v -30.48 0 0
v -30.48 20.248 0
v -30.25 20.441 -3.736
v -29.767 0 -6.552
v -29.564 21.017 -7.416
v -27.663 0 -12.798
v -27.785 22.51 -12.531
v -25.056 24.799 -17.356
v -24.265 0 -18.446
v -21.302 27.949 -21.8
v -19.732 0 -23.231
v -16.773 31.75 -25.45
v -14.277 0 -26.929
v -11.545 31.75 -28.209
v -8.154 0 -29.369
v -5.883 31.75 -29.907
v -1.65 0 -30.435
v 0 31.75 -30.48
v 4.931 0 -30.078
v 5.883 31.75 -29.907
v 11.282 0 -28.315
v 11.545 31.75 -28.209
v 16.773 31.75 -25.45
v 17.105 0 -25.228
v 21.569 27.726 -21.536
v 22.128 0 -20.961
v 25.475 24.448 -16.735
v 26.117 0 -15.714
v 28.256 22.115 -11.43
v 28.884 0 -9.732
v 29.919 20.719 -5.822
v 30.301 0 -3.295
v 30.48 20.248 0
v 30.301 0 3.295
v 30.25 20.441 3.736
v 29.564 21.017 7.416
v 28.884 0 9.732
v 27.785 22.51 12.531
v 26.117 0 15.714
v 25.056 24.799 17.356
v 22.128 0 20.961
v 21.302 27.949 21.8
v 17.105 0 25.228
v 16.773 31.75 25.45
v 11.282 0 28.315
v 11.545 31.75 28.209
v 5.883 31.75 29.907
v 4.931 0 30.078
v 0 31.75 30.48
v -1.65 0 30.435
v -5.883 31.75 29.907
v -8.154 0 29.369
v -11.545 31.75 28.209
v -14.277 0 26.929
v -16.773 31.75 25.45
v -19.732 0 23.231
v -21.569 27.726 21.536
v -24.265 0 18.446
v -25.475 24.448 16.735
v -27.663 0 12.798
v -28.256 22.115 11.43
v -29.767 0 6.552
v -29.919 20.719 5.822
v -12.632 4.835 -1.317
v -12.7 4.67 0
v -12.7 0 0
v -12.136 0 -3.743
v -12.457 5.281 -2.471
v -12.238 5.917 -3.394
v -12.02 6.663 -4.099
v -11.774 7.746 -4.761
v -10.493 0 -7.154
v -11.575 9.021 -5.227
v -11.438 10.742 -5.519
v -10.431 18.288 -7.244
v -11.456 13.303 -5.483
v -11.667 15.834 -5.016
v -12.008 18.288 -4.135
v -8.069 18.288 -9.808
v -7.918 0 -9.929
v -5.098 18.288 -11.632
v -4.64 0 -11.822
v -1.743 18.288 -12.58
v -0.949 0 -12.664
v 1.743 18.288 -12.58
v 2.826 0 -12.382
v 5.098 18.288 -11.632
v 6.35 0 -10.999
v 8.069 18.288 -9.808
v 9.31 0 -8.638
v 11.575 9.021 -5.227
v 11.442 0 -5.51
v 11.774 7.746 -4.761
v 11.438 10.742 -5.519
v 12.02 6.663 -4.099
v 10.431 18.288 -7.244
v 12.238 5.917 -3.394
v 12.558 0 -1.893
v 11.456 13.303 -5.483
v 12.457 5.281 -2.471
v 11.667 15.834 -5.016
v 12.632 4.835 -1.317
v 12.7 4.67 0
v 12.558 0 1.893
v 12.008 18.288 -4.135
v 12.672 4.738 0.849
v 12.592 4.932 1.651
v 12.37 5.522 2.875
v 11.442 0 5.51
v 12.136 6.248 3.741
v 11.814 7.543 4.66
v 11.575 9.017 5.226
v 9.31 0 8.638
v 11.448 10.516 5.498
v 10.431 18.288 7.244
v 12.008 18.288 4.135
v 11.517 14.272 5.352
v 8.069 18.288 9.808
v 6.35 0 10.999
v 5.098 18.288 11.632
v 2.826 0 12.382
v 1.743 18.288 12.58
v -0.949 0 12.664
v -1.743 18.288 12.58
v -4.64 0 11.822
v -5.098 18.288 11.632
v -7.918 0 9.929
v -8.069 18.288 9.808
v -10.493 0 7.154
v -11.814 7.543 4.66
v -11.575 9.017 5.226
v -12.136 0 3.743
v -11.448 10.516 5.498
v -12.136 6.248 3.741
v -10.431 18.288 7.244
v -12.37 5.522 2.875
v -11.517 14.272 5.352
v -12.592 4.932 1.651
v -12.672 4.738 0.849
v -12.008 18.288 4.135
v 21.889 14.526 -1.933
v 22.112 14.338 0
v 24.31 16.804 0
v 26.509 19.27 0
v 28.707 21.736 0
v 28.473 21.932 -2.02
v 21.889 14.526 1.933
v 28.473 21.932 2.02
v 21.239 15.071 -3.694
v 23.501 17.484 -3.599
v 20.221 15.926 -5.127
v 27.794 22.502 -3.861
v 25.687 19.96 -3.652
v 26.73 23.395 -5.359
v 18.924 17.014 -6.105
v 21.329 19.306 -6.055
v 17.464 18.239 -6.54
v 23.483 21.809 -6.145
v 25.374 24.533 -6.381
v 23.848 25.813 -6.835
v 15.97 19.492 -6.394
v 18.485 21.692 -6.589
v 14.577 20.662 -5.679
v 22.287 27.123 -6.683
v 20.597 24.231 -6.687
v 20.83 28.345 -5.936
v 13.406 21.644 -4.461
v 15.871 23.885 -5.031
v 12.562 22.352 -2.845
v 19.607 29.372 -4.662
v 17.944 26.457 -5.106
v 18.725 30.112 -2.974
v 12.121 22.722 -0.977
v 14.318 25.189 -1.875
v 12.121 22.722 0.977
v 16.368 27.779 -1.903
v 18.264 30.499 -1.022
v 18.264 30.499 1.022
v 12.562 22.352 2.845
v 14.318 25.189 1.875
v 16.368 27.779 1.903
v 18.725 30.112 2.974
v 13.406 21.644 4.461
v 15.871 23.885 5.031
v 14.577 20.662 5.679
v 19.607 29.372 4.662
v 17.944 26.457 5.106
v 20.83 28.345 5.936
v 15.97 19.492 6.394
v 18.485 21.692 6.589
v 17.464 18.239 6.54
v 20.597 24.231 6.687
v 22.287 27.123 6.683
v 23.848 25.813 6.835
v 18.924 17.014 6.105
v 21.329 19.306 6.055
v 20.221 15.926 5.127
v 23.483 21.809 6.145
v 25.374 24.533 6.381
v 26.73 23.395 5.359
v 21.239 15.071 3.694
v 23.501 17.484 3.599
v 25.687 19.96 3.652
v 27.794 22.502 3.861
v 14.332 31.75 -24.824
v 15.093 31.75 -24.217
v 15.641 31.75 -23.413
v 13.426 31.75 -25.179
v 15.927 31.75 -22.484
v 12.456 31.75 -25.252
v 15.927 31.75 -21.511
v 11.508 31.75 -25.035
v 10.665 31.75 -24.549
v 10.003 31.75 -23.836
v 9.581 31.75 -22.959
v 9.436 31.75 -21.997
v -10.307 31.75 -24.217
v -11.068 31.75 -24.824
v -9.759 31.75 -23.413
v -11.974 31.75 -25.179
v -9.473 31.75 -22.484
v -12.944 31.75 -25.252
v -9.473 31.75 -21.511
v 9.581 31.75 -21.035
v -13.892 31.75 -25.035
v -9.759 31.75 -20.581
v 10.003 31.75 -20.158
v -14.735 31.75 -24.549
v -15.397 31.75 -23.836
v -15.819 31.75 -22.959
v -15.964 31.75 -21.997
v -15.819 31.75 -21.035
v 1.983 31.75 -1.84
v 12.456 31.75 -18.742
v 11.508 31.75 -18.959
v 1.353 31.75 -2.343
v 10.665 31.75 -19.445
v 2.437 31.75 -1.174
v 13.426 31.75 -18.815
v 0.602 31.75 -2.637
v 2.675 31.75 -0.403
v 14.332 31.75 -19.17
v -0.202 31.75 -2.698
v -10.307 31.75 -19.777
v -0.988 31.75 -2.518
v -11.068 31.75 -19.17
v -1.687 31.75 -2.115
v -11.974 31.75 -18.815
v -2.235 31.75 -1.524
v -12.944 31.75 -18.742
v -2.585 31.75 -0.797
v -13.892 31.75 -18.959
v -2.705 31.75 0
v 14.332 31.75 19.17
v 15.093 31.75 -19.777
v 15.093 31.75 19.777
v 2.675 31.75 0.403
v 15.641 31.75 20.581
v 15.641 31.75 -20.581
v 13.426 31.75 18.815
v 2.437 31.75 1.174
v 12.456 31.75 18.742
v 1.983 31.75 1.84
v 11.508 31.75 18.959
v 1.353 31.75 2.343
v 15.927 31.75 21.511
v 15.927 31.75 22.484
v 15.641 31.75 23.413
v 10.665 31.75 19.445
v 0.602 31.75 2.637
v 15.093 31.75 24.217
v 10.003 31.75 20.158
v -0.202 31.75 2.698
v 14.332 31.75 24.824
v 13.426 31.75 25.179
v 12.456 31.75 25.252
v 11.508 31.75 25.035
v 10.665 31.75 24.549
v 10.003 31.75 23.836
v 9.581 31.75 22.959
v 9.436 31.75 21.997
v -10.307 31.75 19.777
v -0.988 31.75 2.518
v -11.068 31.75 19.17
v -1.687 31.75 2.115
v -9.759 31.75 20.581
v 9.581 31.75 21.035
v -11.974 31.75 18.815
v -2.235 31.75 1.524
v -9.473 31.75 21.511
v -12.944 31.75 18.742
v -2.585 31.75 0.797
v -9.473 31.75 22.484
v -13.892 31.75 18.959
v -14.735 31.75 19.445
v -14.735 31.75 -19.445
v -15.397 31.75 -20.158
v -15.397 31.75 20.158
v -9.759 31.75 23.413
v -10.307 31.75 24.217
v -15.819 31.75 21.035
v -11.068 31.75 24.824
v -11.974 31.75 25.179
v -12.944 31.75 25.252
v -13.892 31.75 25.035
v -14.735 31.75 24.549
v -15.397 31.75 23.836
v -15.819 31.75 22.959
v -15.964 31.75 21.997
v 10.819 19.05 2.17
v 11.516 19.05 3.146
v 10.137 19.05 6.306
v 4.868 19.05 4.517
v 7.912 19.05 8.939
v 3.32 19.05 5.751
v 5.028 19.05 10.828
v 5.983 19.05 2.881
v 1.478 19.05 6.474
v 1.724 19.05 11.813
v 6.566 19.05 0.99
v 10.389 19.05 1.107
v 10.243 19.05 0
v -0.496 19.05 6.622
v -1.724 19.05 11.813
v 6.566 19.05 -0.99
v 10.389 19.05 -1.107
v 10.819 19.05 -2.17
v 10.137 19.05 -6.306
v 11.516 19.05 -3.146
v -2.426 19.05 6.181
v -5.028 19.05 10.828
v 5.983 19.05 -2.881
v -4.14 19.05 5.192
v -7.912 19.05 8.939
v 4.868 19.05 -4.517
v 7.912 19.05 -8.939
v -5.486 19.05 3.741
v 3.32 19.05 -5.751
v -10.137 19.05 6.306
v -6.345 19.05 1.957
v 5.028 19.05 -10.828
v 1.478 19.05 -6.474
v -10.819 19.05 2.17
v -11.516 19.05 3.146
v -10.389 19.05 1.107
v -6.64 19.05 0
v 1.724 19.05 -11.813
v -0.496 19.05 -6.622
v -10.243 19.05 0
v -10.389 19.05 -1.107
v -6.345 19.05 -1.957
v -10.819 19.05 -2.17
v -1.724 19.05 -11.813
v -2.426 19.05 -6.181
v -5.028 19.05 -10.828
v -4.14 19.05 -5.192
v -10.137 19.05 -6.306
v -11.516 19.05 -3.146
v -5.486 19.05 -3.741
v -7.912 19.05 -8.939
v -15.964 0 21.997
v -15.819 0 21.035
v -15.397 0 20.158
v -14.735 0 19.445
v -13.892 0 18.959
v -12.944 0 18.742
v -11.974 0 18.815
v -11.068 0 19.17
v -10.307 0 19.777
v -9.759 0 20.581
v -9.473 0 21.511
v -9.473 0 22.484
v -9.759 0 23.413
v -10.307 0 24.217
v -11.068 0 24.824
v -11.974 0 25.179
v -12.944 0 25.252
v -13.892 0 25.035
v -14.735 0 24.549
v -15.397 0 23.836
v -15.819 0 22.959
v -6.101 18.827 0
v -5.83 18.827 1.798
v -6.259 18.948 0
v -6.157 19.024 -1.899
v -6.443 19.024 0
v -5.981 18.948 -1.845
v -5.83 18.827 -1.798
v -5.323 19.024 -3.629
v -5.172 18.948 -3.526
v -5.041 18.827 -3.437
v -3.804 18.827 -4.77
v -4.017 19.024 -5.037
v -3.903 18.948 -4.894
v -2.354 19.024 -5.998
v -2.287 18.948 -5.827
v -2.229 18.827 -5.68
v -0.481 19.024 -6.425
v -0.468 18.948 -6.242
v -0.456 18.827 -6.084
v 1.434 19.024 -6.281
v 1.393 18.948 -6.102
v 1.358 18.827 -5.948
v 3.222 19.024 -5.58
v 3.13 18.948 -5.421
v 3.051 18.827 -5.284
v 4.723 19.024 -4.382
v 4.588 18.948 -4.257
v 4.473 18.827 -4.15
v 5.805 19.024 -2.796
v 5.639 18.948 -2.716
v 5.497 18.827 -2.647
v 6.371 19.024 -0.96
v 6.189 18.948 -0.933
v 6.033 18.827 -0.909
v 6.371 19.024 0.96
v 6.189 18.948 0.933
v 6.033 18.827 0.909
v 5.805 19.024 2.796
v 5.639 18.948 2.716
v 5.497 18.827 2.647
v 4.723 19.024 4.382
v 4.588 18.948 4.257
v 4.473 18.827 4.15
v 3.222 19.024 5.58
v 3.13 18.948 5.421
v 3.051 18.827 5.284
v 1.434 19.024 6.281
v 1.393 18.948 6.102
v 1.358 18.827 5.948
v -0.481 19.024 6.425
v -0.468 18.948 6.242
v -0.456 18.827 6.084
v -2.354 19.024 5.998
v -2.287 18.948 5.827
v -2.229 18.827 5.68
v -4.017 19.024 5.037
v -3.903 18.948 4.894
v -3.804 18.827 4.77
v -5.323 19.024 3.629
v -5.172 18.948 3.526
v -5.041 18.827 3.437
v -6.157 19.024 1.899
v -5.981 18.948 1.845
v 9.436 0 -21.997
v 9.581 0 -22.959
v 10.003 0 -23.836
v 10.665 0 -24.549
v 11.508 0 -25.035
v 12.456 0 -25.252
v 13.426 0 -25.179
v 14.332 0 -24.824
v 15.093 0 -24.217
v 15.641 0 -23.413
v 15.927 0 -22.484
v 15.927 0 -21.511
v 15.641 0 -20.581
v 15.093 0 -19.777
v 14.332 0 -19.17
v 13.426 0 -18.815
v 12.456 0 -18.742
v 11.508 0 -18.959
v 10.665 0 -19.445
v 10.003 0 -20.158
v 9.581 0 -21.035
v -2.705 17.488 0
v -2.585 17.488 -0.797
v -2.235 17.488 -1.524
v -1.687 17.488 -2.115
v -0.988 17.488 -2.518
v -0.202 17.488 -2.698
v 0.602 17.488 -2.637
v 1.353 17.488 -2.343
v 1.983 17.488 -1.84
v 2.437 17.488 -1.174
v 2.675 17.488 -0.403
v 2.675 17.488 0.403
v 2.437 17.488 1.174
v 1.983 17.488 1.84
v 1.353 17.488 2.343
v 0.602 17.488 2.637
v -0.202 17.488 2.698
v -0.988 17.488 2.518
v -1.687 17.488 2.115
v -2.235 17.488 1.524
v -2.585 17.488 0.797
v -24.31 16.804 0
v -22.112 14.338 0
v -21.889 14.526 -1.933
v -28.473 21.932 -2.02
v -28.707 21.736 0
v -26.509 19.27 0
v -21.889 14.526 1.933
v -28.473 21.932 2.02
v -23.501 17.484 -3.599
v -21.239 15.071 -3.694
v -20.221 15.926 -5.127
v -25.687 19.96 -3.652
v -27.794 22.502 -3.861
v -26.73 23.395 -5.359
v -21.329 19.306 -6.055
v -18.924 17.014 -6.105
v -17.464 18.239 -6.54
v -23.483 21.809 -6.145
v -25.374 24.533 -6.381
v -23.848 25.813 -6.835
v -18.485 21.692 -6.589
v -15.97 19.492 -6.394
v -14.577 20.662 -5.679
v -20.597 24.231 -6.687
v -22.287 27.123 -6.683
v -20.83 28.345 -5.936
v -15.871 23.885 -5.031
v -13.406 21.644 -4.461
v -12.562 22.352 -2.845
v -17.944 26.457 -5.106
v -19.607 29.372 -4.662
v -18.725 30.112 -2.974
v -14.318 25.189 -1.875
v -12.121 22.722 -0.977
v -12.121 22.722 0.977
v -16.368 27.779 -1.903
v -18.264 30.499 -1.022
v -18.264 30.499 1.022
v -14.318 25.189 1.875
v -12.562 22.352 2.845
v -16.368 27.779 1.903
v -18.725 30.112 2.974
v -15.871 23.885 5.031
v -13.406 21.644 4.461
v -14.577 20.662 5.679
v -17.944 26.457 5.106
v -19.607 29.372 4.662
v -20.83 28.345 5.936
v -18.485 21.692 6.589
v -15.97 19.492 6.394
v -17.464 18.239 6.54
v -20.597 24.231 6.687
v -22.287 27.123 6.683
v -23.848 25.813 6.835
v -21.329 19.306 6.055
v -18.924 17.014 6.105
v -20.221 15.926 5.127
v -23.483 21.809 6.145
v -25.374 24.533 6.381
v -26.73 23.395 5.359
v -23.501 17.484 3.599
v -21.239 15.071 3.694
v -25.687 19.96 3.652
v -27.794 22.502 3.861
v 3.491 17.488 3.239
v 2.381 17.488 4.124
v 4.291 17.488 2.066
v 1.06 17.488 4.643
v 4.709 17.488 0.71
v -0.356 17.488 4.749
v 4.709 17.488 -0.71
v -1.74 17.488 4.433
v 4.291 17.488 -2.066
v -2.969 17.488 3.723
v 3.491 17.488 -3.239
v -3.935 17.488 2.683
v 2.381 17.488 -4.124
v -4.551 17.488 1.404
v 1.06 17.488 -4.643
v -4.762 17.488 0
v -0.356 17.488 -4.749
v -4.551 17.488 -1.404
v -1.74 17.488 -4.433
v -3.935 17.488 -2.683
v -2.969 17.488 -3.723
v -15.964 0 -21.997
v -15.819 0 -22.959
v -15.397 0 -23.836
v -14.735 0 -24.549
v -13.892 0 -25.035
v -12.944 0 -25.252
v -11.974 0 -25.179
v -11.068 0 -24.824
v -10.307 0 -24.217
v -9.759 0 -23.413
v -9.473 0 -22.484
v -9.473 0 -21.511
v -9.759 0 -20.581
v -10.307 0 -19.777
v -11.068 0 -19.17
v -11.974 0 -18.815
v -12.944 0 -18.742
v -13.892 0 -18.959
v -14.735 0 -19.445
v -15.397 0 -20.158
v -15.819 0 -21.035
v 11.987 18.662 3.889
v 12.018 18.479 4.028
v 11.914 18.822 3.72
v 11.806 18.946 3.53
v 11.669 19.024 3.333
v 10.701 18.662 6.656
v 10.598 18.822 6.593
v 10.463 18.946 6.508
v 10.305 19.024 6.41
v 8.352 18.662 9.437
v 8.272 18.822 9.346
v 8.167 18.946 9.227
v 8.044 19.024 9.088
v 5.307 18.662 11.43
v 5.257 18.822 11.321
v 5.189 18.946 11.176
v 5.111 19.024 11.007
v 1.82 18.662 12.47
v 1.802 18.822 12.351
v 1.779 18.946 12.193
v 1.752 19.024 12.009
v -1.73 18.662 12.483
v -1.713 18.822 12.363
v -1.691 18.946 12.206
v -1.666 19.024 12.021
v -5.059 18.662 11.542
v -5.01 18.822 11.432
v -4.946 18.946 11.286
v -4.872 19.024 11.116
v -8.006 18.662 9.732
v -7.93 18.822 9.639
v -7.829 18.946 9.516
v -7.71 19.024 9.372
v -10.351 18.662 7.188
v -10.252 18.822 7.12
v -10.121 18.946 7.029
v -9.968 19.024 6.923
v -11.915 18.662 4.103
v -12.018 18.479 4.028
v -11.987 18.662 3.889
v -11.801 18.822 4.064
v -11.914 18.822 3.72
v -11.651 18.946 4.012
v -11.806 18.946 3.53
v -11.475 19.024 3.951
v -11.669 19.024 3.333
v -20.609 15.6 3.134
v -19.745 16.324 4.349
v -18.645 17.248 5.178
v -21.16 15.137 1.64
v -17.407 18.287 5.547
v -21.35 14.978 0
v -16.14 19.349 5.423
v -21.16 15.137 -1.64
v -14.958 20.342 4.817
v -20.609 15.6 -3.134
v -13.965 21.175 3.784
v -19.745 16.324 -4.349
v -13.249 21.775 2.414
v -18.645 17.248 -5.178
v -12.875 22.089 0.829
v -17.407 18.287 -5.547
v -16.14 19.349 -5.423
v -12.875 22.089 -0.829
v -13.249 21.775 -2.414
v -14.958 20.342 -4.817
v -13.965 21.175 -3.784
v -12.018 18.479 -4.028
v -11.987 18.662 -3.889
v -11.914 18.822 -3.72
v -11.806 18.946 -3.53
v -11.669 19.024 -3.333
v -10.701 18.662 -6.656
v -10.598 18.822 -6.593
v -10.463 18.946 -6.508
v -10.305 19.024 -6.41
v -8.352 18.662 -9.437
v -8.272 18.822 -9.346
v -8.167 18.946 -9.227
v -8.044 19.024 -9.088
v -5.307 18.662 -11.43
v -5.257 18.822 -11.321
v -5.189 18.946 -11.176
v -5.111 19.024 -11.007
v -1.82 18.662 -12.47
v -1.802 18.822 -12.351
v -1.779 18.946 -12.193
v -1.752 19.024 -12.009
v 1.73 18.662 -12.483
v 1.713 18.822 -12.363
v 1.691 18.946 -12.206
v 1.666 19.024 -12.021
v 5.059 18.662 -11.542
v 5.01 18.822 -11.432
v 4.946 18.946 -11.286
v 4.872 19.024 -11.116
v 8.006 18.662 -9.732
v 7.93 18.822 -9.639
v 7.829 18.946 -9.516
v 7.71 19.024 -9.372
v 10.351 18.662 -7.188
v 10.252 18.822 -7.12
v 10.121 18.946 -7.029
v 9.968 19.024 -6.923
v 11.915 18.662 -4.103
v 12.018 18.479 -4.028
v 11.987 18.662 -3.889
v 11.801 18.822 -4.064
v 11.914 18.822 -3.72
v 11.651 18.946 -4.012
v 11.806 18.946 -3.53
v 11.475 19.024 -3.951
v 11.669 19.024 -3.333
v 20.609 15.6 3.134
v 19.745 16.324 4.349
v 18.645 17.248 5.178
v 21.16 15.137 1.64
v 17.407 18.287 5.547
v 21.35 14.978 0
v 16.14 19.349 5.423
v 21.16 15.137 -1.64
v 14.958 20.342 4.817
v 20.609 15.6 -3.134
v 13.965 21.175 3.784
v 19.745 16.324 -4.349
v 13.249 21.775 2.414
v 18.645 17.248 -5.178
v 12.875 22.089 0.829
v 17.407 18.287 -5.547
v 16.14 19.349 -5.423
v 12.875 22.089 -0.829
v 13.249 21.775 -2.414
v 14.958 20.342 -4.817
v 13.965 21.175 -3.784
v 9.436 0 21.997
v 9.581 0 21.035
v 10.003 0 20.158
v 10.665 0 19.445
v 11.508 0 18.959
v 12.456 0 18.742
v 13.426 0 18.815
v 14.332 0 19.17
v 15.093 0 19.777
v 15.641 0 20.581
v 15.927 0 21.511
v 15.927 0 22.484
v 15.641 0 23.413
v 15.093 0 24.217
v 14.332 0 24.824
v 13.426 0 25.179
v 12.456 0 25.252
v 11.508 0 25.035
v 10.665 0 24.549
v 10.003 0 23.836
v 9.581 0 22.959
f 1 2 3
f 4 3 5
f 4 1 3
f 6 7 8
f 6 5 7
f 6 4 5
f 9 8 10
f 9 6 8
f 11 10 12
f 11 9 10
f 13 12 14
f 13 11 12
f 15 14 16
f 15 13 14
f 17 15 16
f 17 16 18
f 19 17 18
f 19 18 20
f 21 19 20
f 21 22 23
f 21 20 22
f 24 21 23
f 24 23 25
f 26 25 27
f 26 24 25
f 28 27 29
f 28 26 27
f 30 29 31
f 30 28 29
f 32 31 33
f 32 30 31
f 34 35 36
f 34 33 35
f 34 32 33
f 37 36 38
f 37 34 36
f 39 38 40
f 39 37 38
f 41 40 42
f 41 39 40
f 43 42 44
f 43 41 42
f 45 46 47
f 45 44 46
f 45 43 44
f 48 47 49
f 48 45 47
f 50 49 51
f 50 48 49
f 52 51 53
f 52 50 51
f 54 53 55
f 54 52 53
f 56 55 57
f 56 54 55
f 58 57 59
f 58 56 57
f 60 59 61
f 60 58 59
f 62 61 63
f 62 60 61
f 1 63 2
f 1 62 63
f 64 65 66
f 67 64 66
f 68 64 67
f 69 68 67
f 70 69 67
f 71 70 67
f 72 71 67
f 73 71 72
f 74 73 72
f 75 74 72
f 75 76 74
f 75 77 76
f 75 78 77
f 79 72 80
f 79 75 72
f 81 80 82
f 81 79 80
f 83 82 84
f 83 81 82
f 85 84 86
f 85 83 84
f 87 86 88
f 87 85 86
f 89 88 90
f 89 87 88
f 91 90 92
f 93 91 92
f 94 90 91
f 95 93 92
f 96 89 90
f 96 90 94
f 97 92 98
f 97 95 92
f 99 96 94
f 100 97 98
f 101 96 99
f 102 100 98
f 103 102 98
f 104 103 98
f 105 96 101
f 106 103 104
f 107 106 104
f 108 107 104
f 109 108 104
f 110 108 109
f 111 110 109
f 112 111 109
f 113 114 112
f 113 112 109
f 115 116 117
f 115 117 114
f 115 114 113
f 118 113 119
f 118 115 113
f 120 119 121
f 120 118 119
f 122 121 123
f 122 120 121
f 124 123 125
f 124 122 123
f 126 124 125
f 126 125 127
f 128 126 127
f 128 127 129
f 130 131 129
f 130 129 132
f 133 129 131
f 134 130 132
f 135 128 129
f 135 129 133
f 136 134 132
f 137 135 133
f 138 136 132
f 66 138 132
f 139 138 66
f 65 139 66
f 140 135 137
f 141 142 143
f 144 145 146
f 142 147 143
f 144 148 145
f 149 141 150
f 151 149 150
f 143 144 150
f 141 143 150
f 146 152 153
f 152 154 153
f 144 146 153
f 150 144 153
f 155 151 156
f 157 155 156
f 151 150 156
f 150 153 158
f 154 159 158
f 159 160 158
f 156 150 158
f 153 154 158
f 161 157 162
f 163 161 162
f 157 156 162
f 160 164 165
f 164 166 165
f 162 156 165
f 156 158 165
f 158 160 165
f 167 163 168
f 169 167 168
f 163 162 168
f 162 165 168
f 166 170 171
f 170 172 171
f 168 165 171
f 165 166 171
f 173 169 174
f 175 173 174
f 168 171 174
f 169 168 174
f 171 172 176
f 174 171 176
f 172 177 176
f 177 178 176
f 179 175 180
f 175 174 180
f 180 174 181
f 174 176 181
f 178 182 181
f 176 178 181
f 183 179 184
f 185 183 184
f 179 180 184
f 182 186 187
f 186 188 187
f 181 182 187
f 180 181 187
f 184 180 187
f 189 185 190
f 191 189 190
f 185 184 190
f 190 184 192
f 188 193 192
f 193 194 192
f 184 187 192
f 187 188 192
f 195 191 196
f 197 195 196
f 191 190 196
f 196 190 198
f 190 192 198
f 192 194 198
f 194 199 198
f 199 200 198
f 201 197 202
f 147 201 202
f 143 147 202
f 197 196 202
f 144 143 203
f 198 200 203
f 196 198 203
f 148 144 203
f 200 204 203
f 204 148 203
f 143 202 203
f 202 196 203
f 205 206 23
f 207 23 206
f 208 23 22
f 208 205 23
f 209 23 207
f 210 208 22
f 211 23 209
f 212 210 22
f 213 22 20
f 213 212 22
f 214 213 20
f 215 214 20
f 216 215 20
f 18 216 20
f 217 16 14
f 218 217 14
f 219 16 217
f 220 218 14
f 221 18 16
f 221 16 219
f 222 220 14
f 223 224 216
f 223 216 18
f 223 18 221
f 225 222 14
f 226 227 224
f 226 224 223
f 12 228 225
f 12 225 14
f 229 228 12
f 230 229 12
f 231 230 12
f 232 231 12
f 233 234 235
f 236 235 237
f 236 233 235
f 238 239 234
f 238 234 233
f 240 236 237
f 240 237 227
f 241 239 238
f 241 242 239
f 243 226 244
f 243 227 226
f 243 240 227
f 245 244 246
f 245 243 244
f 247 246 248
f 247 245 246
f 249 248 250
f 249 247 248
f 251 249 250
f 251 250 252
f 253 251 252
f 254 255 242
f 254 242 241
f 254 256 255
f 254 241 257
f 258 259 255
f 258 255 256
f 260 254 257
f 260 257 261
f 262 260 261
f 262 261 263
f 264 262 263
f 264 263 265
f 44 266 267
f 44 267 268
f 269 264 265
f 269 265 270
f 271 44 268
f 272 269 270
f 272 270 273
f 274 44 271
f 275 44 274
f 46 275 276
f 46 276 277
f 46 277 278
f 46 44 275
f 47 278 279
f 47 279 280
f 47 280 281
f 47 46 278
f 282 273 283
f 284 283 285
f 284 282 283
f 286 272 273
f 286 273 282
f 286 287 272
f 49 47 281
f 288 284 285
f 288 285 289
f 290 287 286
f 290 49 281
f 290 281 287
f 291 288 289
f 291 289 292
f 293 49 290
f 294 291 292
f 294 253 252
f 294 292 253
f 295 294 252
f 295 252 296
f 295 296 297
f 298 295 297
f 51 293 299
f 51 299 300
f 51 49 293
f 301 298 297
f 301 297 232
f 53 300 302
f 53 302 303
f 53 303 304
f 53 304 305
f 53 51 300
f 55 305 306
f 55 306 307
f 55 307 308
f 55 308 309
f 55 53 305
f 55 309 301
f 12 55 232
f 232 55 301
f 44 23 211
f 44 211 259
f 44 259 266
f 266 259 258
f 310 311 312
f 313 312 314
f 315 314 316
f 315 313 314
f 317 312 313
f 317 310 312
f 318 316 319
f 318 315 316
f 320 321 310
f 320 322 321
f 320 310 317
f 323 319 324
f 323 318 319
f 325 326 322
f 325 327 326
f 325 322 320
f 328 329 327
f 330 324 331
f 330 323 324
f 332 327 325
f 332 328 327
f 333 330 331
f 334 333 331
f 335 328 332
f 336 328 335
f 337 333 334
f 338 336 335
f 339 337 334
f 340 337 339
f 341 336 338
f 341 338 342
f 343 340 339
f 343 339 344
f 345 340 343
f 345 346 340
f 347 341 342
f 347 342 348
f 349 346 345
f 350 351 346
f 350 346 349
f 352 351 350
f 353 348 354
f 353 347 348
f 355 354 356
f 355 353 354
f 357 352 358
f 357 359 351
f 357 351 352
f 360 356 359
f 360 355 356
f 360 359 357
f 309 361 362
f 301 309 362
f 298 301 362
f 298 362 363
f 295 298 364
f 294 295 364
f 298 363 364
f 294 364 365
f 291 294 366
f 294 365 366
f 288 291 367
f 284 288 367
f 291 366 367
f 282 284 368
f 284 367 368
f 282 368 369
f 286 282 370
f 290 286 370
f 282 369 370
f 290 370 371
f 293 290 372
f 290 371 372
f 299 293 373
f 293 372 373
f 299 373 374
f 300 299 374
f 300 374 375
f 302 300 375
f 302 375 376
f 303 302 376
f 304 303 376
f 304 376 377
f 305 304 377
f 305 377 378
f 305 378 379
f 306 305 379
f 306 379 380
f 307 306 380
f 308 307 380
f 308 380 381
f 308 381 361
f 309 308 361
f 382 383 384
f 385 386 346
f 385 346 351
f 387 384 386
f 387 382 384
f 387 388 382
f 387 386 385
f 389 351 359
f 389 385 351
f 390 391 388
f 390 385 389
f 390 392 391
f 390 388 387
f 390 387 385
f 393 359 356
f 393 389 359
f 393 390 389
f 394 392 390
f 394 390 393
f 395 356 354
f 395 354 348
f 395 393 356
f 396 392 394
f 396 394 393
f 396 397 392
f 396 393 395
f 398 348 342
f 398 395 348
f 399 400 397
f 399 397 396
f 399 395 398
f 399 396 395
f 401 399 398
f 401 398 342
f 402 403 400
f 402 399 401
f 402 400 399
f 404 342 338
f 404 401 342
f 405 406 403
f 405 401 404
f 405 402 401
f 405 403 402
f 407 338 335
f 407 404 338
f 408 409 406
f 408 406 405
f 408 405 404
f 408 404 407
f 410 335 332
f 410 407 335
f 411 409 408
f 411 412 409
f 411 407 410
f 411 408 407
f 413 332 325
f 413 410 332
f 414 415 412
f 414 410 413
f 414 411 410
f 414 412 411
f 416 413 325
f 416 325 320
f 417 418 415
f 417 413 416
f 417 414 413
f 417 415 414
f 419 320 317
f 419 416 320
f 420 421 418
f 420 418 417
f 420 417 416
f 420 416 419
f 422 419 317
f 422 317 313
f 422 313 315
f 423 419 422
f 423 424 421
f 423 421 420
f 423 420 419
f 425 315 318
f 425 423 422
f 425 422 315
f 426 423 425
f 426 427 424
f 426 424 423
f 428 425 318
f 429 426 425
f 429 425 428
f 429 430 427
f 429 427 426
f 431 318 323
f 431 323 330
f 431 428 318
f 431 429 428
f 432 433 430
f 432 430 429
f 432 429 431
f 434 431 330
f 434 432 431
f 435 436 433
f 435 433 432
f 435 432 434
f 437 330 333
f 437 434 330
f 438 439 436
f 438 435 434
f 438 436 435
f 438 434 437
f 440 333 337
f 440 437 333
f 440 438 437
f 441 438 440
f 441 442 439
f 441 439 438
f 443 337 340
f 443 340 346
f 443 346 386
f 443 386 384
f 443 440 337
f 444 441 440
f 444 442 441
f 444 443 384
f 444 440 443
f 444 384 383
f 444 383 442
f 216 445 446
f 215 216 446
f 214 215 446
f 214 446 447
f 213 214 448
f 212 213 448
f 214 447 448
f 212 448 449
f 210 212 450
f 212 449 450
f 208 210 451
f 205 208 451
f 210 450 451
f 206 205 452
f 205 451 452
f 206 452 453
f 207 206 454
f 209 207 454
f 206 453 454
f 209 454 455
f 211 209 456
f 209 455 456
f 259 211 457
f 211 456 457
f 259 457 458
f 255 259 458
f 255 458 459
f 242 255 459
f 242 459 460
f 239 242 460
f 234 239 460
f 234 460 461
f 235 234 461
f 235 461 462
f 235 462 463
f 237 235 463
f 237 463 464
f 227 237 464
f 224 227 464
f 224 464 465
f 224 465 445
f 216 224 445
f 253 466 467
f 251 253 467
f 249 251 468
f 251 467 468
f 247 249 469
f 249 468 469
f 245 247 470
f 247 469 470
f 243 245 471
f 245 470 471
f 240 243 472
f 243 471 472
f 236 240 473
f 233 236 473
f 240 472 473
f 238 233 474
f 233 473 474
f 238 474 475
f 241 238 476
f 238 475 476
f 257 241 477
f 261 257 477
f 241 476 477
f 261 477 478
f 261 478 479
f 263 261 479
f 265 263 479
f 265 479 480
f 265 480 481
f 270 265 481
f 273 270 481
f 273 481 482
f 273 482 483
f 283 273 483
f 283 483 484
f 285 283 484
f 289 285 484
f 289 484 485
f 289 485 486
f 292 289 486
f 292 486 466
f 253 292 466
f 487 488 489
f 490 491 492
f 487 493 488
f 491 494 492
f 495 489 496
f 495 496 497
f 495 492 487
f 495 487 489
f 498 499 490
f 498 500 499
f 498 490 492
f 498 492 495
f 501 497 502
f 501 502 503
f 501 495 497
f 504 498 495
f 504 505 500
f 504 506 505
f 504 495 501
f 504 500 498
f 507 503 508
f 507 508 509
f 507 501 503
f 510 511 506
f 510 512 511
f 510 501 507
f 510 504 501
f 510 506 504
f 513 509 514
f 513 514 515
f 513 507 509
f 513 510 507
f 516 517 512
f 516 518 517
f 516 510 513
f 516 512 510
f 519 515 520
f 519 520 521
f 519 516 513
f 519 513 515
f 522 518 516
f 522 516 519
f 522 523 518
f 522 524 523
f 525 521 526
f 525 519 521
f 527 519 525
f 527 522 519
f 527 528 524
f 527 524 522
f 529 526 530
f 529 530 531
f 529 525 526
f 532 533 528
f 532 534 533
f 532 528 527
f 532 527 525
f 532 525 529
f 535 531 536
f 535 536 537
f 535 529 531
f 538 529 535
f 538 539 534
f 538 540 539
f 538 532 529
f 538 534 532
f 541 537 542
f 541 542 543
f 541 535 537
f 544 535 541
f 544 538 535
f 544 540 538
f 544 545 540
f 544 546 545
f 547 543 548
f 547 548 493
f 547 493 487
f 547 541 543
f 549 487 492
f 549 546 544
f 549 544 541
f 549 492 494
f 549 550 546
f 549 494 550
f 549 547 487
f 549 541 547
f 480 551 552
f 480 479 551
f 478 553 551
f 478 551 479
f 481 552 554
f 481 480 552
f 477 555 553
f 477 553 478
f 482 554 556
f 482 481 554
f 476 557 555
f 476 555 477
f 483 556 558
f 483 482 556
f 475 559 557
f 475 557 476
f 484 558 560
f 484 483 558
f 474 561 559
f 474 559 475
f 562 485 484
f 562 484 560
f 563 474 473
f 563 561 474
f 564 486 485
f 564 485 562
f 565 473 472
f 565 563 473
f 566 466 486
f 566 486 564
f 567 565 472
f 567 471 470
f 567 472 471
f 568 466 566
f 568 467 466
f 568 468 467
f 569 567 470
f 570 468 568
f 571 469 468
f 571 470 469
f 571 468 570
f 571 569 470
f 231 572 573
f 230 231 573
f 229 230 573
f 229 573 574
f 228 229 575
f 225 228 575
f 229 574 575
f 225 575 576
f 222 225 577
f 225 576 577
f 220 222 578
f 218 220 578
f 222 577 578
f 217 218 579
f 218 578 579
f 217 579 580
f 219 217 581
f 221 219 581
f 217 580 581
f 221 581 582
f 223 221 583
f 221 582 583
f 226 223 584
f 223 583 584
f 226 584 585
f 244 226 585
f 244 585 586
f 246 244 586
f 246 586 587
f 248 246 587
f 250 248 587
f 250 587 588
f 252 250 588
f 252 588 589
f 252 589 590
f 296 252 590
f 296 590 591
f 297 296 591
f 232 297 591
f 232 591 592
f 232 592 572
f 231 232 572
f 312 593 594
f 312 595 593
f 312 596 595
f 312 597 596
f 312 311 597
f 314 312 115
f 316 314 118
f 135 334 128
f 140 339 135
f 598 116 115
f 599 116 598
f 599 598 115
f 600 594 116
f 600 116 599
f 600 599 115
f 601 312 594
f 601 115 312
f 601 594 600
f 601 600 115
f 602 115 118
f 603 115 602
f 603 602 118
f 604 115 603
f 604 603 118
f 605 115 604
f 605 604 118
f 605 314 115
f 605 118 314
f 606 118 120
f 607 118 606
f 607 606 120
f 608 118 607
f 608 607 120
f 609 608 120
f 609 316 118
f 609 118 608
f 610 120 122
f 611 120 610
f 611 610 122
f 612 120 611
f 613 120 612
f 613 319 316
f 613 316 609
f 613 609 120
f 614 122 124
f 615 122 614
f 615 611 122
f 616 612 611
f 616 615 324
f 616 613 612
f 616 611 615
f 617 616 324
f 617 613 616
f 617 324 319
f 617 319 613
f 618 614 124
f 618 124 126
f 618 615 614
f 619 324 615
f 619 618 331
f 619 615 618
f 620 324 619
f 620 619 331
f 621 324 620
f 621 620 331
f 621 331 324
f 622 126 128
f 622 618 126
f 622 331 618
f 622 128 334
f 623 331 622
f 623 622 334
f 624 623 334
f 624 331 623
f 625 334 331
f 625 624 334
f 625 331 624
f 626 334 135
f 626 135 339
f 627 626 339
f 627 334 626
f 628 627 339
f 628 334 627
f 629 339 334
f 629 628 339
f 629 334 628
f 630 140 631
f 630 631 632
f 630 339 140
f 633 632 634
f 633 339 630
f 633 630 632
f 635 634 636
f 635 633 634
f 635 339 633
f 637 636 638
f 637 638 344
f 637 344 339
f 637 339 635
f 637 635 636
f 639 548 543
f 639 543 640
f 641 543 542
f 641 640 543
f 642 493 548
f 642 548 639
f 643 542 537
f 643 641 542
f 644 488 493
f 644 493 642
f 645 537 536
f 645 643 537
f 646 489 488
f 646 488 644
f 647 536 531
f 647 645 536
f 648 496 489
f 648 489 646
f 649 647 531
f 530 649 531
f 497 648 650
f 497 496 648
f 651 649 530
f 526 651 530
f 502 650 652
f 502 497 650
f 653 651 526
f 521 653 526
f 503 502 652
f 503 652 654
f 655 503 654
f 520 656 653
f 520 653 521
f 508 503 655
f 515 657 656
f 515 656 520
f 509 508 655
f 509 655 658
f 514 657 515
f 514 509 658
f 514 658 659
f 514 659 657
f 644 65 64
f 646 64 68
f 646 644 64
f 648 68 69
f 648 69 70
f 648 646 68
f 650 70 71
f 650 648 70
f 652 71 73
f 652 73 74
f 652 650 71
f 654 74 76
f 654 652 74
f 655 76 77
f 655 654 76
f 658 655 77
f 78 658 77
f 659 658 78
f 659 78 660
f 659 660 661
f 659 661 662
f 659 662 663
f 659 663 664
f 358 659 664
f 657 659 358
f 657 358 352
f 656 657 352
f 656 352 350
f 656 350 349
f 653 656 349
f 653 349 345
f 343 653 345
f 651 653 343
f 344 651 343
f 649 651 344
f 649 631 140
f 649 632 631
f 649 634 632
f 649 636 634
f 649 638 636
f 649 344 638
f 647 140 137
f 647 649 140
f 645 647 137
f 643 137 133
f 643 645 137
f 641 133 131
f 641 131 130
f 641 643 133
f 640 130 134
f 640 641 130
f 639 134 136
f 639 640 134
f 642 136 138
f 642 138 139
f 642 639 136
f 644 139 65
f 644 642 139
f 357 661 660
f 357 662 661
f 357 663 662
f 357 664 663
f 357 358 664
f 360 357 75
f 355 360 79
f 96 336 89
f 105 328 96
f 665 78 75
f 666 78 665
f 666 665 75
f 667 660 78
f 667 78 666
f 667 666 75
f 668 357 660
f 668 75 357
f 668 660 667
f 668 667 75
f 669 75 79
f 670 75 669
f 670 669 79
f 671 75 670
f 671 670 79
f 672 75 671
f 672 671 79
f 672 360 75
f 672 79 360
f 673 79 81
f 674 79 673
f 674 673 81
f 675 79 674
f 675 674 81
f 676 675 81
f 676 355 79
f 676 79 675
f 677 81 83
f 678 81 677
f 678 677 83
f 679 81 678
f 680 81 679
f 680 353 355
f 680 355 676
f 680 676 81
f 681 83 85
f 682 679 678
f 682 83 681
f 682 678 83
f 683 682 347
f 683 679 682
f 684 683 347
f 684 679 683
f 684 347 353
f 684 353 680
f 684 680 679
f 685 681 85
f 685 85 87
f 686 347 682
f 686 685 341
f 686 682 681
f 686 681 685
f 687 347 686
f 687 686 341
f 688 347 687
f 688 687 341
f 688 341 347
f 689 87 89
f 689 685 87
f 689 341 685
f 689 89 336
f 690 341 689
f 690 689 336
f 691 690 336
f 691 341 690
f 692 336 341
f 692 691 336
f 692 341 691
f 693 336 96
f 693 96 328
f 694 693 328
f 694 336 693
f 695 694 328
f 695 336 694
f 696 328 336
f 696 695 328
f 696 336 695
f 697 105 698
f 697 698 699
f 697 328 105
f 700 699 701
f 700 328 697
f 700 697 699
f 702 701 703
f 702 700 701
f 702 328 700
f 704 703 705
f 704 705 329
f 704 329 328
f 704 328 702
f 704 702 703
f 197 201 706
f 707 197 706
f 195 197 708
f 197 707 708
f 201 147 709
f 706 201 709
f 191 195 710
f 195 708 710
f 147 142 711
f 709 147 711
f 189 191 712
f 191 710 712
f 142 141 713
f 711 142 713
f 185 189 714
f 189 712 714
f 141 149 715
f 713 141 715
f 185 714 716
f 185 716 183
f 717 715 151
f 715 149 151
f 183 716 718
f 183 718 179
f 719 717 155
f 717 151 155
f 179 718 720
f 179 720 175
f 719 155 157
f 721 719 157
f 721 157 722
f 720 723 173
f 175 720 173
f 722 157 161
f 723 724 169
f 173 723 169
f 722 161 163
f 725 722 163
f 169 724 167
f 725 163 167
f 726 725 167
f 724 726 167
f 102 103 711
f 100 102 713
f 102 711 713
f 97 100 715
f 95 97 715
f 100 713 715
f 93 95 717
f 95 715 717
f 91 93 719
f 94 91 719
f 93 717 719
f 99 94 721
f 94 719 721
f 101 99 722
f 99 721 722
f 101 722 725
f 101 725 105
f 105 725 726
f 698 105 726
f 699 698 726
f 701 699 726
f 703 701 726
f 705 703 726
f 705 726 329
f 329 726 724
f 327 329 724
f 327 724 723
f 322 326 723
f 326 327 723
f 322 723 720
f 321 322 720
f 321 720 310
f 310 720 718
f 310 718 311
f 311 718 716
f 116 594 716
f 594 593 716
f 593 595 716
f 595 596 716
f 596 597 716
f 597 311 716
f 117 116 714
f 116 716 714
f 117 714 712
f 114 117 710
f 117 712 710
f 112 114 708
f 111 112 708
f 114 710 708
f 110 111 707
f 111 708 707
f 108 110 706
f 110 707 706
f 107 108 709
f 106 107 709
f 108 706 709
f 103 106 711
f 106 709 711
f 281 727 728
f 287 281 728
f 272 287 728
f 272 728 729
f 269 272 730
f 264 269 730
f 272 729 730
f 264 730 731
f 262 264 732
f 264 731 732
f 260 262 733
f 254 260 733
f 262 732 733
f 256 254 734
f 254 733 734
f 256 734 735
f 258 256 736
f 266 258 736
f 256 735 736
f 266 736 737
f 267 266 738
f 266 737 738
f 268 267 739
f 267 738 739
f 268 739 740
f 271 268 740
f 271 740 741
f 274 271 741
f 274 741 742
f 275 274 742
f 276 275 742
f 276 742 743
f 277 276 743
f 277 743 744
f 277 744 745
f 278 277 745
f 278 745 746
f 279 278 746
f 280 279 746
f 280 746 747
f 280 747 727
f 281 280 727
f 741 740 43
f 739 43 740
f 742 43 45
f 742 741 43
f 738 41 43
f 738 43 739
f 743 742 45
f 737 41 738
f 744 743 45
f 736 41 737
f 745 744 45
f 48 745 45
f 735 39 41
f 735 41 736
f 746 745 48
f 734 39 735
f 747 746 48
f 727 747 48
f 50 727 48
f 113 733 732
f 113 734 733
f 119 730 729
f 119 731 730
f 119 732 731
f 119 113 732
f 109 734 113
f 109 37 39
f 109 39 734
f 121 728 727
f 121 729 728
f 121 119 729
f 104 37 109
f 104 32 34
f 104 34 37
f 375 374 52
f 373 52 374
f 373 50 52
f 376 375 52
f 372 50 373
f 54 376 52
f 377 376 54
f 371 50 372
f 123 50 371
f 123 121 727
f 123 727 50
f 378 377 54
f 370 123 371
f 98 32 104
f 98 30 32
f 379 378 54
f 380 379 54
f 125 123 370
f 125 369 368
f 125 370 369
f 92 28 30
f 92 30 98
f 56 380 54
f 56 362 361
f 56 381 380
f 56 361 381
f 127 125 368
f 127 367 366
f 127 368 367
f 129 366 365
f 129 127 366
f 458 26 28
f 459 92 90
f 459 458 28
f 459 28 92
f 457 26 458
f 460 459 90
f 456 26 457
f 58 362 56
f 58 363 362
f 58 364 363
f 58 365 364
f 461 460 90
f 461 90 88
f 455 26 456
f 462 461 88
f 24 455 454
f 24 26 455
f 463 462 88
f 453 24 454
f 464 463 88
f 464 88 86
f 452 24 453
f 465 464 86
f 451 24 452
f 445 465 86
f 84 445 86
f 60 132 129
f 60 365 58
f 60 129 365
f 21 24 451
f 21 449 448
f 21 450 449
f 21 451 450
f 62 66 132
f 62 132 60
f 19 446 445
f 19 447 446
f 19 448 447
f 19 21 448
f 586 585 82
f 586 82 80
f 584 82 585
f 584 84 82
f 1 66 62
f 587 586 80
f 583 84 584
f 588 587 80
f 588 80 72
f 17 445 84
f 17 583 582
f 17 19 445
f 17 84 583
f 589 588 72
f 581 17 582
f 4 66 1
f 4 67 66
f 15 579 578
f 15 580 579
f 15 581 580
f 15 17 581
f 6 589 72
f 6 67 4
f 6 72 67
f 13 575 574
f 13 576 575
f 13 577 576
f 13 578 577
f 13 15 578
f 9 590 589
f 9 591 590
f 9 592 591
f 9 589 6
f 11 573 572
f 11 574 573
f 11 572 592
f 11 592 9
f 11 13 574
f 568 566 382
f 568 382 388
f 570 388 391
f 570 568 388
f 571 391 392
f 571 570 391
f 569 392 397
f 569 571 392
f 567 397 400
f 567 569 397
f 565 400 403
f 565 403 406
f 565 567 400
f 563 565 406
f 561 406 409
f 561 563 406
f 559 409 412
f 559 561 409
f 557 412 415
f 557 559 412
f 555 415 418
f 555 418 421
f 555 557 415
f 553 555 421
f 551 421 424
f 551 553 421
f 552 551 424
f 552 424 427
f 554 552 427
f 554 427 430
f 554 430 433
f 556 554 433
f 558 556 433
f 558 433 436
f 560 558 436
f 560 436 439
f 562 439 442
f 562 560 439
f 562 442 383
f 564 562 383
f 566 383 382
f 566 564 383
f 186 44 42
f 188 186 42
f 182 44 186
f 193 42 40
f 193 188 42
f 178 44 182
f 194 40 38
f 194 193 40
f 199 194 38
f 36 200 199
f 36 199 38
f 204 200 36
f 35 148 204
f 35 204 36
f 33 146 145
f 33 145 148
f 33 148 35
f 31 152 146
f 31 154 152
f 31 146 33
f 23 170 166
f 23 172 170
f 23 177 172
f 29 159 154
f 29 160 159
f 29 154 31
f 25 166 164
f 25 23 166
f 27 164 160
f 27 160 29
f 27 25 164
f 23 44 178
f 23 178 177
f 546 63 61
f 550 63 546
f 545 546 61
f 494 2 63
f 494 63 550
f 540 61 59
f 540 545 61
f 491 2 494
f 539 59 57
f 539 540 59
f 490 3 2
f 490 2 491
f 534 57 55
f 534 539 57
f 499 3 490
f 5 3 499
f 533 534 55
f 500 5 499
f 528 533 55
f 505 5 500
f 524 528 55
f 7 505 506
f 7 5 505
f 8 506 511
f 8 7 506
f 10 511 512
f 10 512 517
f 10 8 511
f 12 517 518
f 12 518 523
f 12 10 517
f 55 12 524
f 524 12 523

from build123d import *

# Parameters (mm, degrees)
CUT_EXTRUDE1_DEPTH         = 58.529738397
CUT_EXTRUDE1_DEPTH_BACK    = 58.529738397
F_1_4_28_TAPPED_HOLE1_D    = 5.4102
CUT_EXTRUDE2_START         = -6.35
SKETCH5_R                  = 30.48
CUT_EXTRUDE2_DEPTH         = 6.35
USE_ROUND_CORNER_ENDMILL_R = 0.762
F_1_4_CLEARANCE_HOLE1_D    = 6.5278


with BuildPart() as part:
    # MASTER → MASTER_SKETCH (revolve)
    with BuildSketch(Plane.XY):
        Polygon((0, 38.1), (-30.48, 38.1), (-30.48, 0), (-12.7, 0), (-12.7, 19.05), (-6.3246, 19.05), (-4.7625, 17.4879), (0, 17.4879), align=None)
    revolve(axis=Axis((0, 38.1, 0), (0, -1, 0)))

    # Sketch2 → Cut-Extrude1 (cut, two sides: drawn at the far end of the back side and taken through both)
    with BuildSketch(Plane.XY.offset(-CUT_EXTRUDE1_DEPTH_BACK)):
        Polygon((-30.48, 20.248277745), (-9.205145869, 38.1), (-30.48, 38.1), align=None)
        Polygon((30.48, 38.1), (9.205145869, 38.1), (30.48, 20.248277745), align=None)
    extrude(amount=CUT_EXTRUDE1_DEPTH + CUT_EXTRUDE1_DEPTH_BACK, mode=Mode.SUBTRACT)

    # 1/4-28 Tapped Hole1 (through all)
    with Locations(Plane(origin=(0, 38.1, 0), x_dir=(1, 0, 0), z_dir=(0, 1, 0))):
        with Locations((0, 0)):
            Hole(F_1_4_28_TAPPED_HOLE1_D / 2)

    # Sketch5 → Cut-Extrude2 (cut)
    with BuildSketch(Plane(origin=(0, 38.1, 0), x_dir=(1, 0, 0), z_dir=(0, 1, 0)).offset(CUT_EXTRUDE2_START)):
        with Locations(Location((0, 0, 0), (0, 0, 180))):
            Circle(SKETCH5_R)
    extrude(amount=CUT_EXTRUDE2_DEPTH, mode=Mode.SUBTRACT)

    # use-round-corner-endmill
    use_round_corner_endmill_edges = [part.edges().sort_by_distance(p)[0] for p in [
        (6.3246, 19.05, 0),
        (12.7, 19.05, 0),
    ]]
    fillet(use_round_corner_endmill_edges, radius=USE_ROUND_CORNER_ENDMILL_R)

    # Sketch7 → 1/4 NPT Tapped Hole1 (revolve, cut)
    with BuildSketch(Plane(origin=(-23.455832083, 26.142254454, 0), x_dir=(-0.7660444431189741, -0.642787609686544, 0), z_dir=(0, 0, 1))):
        Polygon((0, 0), (0, 54.695413336), (5.5626, 54.695413336), (5.5626, 9.906), (6.557984794, 9.906), (6.8545837, 0), align=None)
    f_1_4_npt_tapped_hole1 = revolve(axis=Axis((-27.537533405, 31.006636667, 0), (0.6427876096865441, -0.7660444431189741, 0)), mode=Mode.SUBTRACT)

    # Mirror1: 1/4 NPT Tapped Hole1 across plane
    add(f_1_4_npt_tapped_hole1.mirror(Plane(origin=(0, 0, 0), x_dir=(0, 0, 1), z_dir=(1, 0, 0))), mode=Mode.SUBTRACT)

    # 1/4 Clearance Hole1 (through all)
    with Locations(Plane(origin=(0, 31.75, 0), x_dir=(1, 0, 0), z_dir=(0, 1, 0))):
        with Locations((-12.7, -21.997045256), (12.7, -21.997045256), (12.7, 21.997045256), (-12.7, 21.997045256)):
            Hole(F_1_4_CLEARANCE_HOLE1_D / 2)


solid = part.part
